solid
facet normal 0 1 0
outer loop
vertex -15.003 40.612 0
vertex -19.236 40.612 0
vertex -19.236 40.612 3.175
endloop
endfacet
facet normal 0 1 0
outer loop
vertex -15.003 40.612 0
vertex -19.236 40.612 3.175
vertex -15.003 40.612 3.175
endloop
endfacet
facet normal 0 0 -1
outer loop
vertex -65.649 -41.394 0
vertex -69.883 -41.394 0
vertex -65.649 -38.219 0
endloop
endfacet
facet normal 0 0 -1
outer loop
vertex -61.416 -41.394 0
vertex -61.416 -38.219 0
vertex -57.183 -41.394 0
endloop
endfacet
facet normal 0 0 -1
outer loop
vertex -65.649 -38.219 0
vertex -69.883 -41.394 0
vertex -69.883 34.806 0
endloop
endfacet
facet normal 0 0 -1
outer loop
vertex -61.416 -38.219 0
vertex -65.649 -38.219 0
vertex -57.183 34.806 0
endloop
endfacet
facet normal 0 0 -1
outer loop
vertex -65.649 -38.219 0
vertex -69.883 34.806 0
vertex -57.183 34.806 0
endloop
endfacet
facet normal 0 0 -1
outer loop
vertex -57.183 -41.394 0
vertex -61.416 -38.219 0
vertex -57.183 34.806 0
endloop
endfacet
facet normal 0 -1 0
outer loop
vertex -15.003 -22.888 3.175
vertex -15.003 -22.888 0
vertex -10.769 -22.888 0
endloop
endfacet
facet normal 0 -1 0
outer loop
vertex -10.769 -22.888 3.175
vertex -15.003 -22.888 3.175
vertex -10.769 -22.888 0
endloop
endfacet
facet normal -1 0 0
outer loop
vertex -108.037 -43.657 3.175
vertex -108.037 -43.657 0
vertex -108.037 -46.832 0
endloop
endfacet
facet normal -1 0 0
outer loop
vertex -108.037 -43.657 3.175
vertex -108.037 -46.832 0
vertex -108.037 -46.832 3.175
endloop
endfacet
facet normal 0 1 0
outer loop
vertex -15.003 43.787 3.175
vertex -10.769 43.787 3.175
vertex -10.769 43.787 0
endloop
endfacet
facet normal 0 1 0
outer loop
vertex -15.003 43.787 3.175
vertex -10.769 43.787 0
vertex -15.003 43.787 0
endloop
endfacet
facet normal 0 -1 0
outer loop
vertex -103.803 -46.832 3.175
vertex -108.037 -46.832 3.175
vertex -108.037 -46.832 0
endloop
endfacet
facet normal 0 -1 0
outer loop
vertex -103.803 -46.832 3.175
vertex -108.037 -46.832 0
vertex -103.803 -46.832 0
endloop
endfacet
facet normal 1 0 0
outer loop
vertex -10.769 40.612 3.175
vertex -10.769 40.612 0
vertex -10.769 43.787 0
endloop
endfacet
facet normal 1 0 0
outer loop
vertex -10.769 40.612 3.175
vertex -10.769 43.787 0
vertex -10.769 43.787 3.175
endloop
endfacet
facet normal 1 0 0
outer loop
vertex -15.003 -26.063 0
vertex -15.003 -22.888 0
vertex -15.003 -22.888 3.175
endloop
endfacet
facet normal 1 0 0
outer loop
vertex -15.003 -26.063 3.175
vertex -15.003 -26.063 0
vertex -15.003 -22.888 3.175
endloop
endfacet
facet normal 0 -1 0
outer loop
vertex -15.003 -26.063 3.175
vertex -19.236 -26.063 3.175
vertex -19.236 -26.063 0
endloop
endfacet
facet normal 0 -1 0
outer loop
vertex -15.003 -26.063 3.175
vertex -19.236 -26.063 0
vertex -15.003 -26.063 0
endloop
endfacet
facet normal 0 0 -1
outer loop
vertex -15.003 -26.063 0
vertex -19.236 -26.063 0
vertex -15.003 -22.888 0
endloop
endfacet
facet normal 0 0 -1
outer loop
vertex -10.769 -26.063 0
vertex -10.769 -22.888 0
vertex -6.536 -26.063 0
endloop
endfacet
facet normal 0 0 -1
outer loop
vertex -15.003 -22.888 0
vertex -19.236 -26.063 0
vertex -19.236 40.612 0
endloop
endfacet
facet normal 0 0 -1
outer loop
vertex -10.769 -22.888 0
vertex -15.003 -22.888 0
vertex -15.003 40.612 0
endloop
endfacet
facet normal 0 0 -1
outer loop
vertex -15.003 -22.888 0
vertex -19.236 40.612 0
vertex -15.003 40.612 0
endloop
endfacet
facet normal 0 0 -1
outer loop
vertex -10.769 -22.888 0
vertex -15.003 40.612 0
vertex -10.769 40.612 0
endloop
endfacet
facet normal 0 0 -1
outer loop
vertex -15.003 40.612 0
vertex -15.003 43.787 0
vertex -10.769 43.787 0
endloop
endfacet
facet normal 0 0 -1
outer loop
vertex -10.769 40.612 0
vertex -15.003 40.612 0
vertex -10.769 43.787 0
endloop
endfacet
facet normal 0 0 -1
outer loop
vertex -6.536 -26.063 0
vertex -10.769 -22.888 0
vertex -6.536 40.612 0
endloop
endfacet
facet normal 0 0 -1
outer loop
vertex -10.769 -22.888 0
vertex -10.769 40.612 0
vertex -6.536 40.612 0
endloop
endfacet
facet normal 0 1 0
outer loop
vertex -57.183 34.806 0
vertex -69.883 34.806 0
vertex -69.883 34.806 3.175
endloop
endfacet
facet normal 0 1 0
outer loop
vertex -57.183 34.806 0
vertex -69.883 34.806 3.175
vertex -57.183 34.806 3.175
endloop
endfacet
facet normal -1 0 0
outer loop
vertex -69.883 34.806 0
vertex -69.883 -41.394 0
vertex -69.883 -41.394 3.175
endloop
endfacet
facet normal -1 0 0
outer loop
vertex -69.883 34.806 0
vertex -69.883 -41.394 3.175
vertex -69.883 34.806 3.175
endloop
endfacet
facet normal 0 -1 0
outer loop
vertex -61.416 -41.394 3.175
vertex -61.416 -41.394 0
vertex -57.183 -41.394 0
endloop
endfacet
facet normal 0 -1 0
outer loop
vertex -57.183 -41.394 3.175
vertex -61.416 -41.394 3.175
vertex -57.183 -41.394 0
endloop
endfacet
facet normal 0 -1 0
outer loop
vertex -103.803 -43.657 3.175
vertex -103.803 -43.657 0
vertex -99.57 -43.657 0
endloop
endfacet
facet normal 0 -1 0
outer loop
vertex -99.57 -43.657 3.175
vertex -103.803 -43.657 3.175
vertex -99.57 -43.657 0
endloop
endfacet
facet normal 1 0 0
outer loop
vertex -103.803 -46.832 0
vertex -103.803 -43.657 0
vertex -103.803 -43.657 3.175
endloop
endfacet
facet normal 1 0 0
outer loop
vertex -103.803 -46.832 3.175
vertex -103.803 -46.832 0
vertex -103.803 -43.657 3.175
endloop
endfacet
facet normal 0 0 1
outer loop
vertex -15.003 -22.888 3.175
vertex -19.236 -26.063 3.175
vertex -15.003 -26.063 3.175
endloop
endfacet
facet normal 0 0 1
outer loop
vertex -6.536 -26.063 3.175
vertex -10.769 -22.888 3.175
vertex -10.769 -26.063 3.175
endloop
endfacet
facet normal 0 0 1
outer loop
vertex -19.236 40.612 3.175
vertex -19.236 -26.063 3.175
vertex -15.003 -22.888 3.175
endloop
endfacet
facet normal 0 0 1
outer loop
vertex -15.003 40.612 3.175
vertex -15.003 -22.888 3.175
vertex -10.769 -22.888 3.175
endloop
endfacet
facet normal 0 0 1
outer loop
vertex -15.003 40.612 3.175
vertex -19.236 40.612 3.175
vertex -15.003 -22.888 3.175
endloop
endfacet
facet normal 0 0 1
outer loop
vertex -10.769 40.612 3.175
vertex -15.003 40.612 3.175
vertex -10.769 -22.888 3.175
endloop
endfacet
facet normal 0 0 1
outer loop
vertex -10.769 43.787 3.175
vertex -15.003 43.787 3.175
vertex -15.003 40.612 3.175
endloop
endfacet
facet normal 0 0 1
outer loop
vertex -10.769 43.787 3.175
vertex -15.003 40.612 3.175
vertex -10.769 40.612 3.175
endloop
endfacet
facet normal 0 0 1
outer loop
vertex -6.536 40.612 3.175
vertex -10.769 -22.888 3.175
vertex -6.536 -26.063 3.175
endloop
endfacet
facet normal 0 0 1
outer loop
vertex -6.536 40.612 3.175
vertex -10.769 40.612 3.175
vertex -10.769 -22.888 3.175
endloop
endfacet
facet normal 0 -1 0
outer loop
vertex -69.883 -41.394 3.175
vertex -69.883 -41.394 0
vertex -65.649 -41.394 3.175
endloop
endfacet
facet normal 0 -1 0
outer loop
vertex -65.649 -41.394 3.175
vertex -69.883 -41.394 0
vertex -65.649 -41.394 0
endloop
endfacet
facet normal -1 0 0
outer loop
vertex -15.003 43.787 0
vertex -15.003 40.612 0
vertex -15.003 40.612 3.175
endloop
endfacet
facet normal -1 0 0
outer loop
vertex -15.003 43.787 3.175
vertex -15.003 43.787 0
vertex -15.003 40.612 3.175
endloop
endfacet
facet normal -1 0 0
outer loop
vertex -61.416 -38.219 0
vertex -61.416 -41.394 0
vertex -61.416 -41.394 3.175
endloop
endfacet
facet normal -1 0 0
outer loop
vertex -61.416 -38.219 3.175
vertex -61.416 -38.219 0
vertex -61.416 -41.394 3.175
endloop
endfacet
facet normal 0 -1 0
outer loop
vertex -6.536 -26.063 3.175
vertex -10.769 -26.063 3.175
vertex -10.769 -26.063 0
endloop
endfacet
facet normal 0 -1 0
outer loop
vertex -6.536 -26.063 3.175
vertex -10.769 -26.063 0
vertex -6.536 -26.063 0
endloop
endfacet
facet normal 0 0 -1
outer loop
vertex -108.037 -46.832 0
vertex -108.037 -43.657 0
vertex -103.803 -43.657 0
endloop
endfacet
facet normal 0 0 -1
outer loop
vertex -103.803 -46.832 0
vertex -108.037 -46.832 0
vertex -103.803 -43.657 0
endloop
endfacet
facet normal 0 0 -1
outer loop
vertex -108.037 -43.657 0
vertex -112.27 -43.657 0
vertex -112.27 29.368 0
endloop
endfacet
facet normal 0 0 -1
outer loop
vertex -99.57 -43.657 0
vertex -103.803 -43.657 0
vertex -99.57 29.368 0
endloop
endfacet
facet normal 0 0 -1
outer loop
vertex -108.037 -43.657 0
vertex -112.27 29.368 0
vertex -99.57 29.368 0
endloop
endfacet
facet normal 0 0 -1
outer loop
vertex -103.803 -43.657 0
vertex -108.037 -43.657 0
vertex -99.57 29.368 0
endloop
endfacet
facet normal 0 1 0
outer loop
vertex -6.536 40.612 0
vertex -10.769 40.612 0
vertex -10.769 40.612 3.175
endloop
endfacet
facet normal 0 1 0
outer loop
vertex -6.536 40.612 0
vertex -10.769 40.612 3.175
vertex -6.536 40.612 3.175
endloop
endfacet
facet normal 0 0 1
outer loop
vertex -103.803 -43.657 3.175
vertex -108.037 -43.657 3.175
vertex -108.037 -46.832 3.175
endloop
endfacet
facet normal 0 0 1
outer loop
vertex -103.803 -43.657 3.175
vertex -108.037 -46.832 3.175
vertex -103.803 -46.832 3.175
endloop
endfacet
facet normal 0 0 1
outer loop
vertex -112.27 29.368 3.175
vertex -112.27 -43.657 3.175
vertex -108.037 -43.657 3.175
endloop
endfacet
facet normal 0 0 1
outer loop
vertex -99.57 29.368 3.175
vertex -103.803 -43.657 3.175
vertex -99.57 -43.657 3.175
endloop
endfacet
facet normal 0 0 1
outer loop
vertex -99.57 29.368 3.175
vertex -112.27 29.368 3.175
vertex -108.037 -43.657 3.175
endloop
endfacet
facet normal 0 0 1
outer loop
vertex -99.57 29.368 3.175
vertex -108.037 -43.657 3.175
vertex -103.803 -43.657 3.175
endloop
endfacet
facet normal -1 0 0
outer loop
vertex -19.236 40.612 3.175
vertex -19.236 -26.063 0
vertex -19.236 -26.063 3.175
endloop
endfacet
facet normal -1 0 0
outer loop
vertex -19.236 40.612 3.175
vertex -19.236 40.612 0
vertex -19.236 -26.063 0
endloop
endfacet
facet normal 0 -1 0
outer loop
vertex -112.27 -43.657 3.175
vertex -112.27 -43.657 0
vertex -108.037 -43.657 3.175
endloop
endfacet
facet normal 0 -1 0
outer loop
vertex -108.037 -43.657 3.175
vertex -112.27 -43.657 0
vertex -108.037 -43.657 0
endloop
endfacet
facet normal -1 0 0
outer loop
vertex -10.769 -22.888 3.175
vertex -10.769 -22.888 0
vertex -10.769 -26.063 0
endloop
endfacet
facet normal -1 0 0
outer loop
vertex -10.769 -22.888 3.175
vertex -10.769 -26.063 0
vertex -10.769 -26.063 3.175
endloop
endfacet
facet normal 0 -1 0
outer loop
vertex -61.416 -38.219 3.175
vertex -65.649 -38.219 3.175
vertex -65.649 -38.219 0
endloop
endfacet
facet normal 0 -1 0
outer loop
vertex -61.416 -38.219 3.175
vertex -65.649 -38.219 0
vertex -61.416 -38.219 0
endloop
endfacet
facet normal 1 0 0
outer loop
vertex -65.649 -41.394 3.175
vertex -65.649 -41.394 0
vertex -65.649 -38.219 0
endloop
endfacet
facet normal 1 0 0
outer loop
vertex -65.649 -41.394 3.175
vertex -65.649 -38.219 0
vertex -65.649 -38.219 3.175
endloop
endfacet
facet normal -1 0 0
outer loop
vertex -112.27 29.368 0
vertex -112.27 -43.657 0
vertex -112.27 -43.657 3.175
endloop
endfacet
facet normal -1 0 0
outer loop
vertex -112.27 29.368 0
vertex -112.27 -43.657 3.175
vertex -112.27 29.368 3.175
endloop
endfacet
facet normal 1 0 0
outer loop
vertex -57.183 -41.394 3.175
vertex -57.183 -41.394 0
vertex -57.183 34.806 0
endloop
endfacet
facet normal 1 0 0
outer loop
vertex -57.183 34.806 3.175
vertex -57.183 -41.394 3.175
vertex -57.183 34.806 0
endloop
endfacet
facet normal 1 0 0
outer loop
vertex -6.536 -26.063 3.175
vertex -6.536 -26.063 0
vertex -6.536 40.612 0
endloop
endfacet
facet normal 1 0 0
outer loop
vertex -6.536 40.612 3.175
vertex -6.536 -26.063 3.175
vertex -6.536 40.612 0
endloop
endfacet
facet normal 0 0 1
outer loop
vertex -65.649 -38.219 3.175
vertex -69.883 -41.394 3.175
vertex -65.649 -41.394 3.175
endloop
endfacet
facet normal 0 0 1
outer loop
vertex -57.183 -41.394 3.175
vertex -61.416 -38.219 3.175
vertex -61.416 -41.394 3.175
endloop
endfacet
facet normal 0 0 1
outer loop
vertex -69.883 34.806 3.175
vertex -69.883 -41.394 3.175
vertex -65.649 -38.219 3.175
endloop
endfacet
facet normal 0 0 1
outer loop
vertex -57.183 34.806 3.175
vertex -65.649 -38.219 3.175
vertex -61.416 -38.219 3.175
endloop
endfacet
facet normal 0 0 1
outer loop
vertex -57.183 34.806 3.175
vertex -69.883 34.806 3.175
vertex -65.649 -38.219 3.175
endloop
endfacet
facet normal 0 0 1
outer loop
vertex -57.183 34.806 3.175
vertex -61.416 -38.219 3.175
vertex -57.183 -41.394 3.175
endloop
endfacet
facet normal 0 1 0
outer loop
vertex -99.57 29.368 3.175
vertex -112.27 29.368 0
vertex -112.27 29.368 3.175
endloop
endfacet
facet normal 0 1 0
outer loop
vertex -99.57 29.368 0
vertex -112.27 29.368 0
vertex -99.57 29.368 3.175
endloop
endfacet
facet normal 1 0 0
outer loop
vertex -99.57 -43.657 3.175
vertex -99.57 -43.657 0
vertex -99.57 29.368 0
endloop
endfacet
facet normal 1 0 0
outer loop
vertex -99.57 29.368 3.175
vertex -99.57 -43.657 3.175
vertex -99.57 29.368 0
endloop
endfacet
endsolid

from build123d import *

# Parameters (mm, degrees)
F0_W      = 12.7
F0_H      = 73.025
F1_DEPTH  = 3.175
F0_H_2    = 76.2
F0_H_3    = 63.5
F2_W      = 4.2333333333
F2_H      = 3.175
F3_DEPTH  = 11.1125
F4_W      = 4.2333333333
F4_H      = 3.175
F5_DEPTH  = 3.175
F6_W      = 4.2333333333
F6_H      = 3.175
F7_DEPTH  = 3.175
F8_W      = 4.2333333333
F8_H      = 3.175
F9_DEPTH  = 3.175
F10_W     = 4.2333333333
F10_H     = 3.175
F11_DEPTH = 3.175


with BuildPart() as f1:
    # F0 (on Top) → F1 (new body)
    with BuildSketch(Plane.XY):
        with Locations((-105.9199720621, -7.1449020383)):
            Rectangle(F0_W, F0_H)
    extrude(amount=F1_DEPTH)

    # F6 (on face) → F7 (join)
    with BuildSketch(Plane.XZ.offset(43.6574020383)):
        with Locations((-105.9199720621, 1.5875)):
            Rectangle(F6_W, F6_H)
    extrude(amount=F7_DEPTH)


with BuildPart() as f1b:
    # F0 (on Top) → F1, piece 2 (new body)
    with BuildSketch(Plane.XY):
        with Locations((-63.5328324676, -3.2940139115)):
            Rectangle(F0_W, F0_H_2)
    extrude(amount=F1_DEPTH)

    # F8 (on face) → F9 (cut)
    with BuildSketch(Plane.XZ.offset(41.3940139115)):
        with Locations((-63.5328324676, 1.5875)):
            Rectangle(F8_W, F8_H)
    extrude(amount=-F9_DEPTH, mode=Mode.SUBTRACT)


with BuildPart() as f1c:
    # F0 (on Top) → F1, piece 3 (new body)
    with BuildSketch(Plane.XY):
        with Locations((-12.8860412329, 8.8615444601)):
            Rectangle(F0_W, F0_H_3)
    extrude(amount=F1_DEPTH)

    # F2 (on face) → F3 (join)
    with BuildSketch(Plane(origin=(0, 29.3675979617, 0), x_dir=(-1, 0, 0), z_dir=(0, 1, 0))):
        with Locations((12.8860412329, 1.5875)):
            Rectangle(F2_W, F2_H)
    extrude(amount=F3_DEPTH)

    # F4 (on face) → F5 (join)
    with BuildSketch(Plane.XZ.offset(22.8884555399)):
        with Locations((-17.1193745663, 1.5875)):
            Rectangle(F4_W, F4_H)
        with Locations((-8.6527078996, 1.5875)):
            Rectangle(F4_W, F4_H)
    extrude(amount=F5_DEPTH)

    # F10 (on face) → F11 (join)
    with BuildSketch(Plane(origin=(0, 40.6115444601, 0), x_dir=(-1, 0, 0), z_dir=(0, 1, 0))):
        with Locations((12.8860412329, 1.5875)):
            Rectangle(F10_W, F10_H)
    extrude(amount=F11_DEPTH)


solid = Compound([f1.part, f1b.part, f1c.part])
